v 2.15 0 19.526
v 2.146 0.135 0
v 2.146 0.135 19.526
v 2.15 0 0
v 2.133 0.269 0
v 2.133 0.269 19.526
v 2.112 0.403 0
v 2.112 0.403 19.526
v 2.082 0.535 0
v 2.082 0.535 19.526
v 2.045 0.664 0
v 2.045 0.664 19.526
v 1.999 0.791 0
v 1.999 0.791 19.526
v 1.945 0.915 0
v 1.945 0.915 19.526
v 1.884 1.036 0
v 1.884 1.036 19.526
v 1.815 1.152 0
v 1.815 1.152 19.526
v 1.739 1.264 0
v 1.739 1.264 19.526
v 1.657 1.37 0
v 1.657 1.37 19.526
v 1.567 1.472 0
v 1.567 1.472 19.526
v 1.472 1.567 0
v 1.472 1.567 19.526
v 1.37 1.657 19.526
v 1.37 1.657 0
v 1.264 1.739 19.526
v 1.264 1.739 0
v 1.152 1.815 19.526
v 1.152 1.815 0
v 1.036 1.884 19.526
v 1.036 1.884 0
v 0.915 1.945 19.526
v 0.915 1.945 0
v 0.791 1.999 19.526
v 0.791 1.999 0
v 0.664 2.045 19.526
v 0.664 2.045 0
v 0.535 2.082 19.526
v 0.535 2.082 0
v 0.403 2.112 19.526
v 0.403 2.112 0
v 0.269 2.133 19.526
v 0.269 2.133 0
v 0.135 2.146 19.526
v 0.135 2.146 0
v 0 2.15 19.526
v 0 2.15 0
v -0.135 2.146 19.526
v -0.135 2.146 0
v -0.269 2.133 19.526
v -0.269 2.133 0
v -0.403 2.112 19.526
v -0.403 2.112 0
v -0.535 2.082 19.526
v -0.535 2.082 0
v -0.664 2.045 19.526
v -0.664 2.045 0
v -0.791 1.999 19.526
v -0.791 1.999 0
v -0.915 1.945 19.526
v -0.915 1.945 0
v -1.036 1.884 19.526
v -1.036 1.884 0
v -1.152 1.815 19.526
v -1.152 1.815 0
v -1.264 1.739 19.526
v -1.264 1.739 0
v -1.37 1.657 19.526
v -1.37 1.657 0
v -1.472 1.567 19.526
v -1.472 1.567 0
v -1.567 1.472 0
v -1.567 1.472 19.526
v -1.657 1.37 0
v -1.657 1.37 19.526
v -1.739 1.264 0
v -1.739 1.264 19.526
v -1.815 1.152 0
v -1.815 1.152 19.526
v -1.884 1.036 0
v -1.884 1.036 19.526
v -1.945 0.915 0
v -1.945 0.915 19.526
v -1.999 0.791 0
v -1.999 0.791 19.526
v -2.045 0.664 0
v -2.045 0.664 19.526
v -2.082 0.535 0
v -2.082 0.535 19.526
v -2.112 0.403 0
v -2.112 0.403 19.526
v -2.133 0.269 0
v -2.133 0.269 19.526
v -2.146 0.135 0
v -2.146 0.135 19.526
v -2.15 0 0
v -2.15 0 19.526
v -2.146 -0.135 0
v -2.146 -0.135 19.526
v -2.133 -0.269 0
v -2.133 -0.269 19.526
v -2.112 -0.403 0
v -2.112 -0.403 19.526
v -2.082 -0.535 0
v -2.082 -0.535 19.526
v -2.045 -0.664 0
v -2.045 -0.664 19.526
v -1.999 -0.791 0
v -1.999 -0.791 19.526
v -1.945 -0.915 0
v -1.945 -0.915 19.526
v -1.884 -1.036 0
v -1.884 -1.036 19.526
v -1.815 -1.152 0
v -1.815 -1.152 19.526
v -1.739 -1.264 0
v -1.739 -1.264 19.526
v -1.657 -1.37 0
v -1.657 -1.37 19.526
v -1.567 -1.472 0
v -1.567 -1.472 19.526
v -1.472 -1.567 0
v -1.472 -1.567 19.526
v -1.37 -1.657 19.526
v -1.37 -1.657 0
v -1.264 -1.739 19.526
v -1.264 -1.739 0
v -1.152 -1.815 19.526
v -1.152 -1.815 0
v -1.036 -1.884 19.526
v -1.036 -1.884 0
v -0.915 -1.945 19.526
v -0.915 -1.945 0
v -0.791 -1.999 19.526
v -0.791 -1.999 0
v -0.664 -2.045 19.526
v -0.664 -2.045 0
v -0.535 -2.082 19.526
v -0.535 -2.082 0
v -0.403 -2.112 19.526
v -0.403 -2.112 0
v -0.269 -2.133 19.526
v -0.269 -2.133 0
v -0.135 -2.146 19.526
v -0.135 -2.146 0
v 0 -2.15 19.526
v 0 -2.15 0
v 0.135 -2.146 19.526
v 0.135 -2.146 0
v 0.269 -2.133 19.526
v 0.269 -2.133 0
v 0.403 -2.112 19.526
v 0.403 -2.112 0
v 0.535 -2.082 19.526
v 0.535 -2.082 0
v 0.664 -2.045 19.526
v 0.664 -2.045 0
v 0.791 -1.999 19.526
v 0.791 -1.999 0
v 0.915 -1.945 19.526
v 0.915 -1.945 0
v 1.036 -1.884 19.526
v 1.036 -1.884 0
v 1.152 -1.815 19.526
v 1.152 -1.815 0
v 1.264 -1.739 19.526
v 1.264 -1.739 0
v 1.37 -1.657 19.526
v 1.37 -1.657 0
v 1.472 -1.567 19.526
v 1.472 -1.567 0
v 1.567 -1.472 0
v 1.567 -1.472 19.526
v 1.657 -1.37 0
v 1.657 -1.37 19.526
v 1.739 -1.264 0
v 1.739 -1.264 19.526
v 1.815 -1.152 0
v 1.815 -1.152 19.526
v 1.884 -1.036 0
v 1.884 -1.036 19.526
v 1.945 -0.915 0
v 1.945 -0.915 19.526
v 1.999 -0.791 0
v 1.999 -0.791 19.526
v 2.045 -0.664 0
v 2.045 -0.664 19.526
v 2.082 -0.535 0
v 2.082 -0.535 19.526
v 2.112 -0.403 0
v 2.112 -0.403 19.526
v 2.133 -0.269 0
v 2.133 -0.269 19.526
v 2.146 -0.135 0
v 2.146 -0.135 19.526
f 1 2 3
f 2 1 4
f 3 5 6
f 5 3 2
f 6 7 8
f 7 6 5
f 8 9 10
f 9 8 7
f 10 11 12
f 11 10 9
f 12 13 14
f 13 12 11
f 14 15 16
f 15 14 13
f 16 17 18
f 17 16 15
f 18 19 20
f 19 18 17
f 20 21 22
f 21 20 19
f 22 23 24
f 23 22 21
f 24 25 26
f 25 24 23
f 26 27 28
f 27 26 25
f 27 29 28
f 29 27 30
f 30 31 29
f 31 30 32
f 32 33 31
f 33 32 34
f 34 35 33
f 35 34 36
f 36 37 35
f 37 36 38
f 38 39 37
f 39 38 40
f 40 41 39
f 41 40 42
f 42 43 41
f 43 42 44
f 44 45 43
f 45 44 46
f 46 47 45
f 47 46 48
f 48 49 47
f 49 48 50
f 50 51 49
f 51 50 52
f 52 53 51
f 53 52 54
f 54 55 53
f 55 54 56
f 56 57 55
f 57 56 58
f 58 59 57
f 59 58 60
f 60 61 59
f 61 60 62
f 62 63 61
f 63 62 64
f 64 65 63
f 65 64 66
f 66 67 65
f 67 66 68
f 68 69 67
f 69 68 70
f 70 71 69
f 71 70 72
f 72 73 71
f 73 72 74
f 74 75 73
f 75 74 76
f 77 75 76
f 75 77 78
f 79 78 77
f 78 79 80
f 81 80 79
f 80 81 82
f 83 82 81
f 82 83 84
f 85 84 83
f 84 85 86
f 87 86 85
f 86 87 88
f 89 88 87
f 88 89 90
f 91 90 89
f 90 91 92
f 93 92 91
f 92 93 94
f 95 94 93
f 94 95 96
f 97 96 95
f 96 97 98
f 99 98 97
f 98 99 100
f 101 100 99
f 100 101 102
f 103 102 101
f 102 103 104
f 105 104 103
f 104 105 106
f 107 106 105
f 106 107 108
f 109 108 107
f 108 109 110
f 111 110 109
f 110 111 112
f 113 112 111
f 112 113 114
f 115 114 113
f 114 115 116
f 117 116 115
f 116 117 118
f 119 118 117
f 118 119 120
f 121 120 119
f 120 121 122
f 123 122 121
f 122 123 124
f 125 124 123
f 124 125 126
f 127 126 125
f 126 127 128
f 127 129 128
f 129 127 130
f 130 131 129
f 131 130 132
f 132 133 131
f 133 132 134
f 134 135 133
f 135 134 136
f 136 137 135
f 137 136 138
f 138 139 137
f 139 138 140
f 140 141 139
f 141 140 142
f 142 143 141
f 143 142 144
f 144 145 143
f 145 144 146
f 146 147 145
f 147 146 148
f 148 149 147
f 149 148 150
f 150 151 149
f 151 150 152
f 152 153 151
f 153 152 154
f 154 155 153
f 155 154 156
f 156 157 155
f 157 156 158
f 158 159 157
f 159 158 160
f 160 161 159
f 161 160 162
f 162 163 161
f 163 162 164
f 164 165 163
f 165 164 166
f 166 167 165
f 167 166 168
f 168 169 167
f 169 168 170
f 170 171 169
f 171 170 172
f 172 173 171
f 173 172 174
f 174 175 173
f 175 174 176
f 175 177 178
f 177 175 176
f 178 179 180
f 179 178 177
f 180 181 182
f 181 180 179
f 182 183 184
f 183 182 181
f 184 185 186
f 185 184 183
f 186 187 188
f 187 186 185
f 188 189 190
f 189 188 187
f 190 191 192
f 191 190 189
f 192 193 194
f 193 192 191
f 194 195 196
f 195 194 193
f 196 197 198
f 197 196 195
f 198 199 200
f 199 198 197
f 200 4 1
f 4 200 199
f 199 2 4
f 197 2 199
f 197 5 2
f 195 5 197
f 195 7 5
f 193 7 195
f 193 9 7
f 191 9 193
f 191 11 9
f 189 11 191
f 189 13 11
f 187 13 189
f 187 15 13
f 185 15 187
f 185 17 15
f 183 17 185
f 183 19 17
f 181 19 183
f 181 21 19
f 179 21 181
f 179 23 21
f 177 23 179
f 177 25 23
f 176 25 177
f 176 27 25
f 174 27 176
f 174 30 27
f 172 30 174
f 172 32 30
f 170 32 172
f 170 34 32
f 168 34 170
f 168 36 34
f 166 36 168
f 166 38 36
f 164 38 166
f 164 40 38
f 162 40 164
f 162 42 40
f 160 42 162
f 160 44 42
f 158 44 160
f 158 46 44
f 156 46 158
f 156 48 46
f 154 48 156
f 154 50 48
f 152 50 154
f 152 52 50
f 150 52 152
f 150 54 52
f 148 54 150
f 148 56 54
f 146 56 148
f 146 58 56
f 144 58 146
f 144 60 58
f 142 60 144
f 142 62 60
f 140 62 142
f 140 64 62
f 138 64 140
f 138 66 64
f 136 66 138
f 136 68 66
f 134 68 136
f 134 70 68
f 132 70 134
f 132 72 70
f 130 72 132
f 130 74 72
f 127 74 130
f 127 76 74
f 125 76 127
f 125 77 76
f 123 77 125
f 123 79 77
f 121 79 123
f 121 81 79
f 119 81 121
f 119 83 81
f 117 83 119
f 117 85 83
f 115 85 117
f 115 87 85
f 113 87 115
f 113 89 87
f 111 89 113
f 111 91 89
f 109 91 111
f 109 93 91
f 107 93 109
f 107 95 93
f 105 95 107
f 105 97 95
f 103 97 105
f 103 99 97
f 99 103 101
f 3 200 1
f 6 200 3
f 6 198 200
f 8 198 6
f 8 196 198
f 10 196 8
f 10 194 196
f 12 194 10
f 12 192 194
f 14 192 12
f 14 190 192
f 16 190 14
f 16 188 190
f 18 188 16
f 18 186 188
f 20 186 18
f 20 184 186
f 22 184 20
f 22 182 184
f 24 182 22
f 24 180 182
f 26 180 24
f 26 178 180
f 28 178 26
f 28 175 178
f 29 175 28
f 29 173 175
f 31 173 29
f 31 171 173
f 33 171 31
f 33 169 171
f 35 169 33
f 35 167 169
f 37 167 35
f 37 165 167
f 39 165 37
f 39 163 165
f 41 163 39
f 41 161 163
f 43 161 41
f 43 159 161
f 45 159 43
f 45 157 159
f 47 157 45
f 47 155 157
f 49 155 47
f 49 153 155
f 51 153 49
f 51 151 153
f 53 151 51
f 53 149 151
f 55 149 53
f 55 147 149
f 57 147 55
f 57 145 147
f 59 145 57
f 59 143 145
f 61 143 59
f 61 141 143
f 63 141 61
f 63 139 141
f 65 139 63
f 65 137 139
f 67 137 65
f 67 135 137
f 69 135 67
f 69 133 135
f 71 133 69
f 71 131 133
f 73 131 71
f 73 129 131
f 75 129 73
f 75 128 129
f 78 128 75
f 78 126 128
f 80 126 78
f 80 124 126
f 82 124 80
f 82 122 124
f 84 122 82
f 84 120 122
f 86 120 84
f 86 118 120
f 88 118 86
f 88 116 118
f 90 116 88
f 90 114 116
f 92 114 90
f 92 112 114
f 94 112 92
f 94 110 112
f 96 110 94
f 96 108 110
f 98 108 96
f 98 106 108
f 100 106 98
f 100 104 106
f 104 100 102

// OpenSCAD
////////////////////////////////////////////////////////////////////////////////
//
// Headstock.scad
//
// Contains OpenScad code for the headstock for the guitar chord chart
// project.
//
// Copyright (C) 2015-2016 Joseph M. Corbett
//
// This program is free software: you can redistribute it and/or modify it under
// the terms of the GNU General Public License as published by the Free Software
// Foundation, either version 3 of the License, or (at your option) any later
// version.
//
// This program is distributed in the hope that it will be useful, but
// WITHOUT ANY WARRANTY; without even the implied warranty of MERCHANTABILITY or
// FITNESS FOR A PARTICULAR PURPOSE. See the GNU General Public License for more
// details.
//
// You should have received a copy of the GNU General Public License along with
// this program. If not, see <http://www.gnu.org/licenses>.
//
/////////////////////////////////////////////////////////////////////////////////

include <ChordChartParameters.scad>             // For part parameters.
use<MCAD/regular_shapes.scad>                   // For torus().
use<MCAD/boxes.scad>                            // For roundedBox().


// Local constants
HoleTolerance           = 0.2;                  // Amount to enlarge holes.
PrinterTolerance        = 0.2;                  // Amount to enlarge hole diameters
                                                //    due to printing tolerance.


// Position children at tuner holes.
module TunerPositions()
{
    // For each tuner hole.
    for (xlation = TunerCoords)
    {
        // For each child.
        for (theChild = [0:$children - 1])
        {
            // Translate the child.
            translate(xlation) children(theChild);
        }
    }
}

// A single tuner shaft that connects the tuner box to the tuning knob.
module TunerShaft(tolerance = 0)
{
    // Shaft which will plug into a tuning knob.
    cylinder(r = TunerShaftRadius + tolerance / 2 + 0.1, h = TunerShaftLength);
}

// A single tuner box.  Part of the tuner assembly.
module TunerBox()
{
    difference()
    {
        // A tuner box consists of a box...
        translate([(TunerHoleSpacing - TunerBoxLength) / 2, 
                   (TunerBaseWidth-TunerBoxWidth) / 2, TunerBaseThickness])
                   cube([TunerBoxLength, TunerBoxWidth, TunerBoxHeight]);
        // ... and a hole for the shaft which will plug into a tuning knob.
        translate([2 * TunerHoleSpacing / 3,
                  TunerBaseWidth / 2, TunerBoxHeight / 2 + TunerBaseThickness])
          rotate(X * 90) 
          TunerShaft(PrinterTolerance);
    }
}

// A tuner post contains the concave post, a bushing, and a hole for the string.
module TuningPost()
{
        difference()
        {
            // The post itself.
            cylinder(r = TunerHoleRadius-PrinterTolerance / 2, 
                     h = HeadThickness + TunerBushingHeight + TunerPostHeight +
                       TunerBoxHeight / 2 + TunerBaseThickness - PrinterTolerance - 2);
            // Make the post concave by subtracting a torus from its outside.
            translate([0, 0, HeadThickness + TunerPostHeight / 2 + TunerBushingHeight +
                       TunerBoxHeight / 2 + TunerBaseThickness - 2])
                torus(outerRadius = 30, innerRadius = TunerHoleRadius - 0.7);
            // The hole for the string.
            translate([-TunerHoleRadius - 1, 0, 
                      HeadThickness+TunerPostHeight / 2 + TunerBushingHeight +
                      TunerBoxHeight / 2 + TunerBaseThickness - 2])
                      rotate(Y * 90) cylinder(r = TunerStringHoleRadius, 
                                              h = TunerHoleRadius * 2 + 2);
        }
        // The bushing around the post.
        translate([0, 0, HeadThickness + TunerBoxHeight / 2 + TunerBushingHeight - PrinterTolerance - 2]) 
            cylinder(r1 = TunerBushingRadius, r2 = TunerHoleRadius, h = TunerBushingHeight);
}


// A tuning knob that connects to the tuning shaft.
module TuningKnob()
{
    height = 2 * TunerShaftRadius + PrinterTolerance + 2.4;
    intersectDiameter = 4 * TunerHoleSpacing;

//    rotate(Z * (-90+TunerAngle)) 
    difference()
    {
        intersection()
        {
            // The basic knob.
            scale([0.75, 1, 1]) cylinder(d = TunerHoleSpacing * 0.75, h = height);
            // Round the top of the knob.
            translate([0, 0, -intersectDiameter / 2 + height])
                sphere(d = intersectDiameter);
            // Round the bottom of the knob.
            translate([0, 0, intersectDiameter / 2]) sphere(d = intersectDiameter);
        }
        // Bore out the hole for the tuning shaft.
        translate([2, 0, TunerShaftRadius + PrinterTolerance + 1]) rotate(Y * 90)
            cylinder(r = TunerShaftRadius + PrinterTolerance, h = 10);
    }
}

// A tuner assembly that includes the tuner base and tuner boxes.
module TunerAssembly()
{
    // Rotate the entire assembly.
    rotate([180, 0, TunerAngle])
    difference()
    {
        union()
        {
            // The tuner base that accommodates all 6 tuner boxes.
            translate([TunerBaseLength / 2, 
                       TunerBaseWidth / 2, 
                       TunerBaseThickness / 2])
            roundedBox(size = [TunerBaseLength, TunerBaseWidth, 
                       TunerBaseThickness], radius = 3, sidesonly = true);
            // The six tuner boxes.
            for (i = [0:len(TunerCoords) - 1])
            {
                translate([i * TunerHoleSpacing, 0, 0]) TunerBox();
            }
        }
        // The holes in the base and box to accommodate the tuner mounting post.
        for (i = [0:len(TunerCoords) - 1])
        {
            translate([i * TunerHoleSpacing + TunerHoleSpacing / 3,
                       TunerBaseWidth / 2, 
                      -(TunerBoxHeight + TunerBaseThickness)])
            cylinder(r = TunerHoleRadius, 
                     h = HeadThickness / 2 + TunerBushingHeight + TunerBoxHeight - 1 - PrinterTolerance);
        }
    }
}

// The headstock without holes.  All dimensions gathered from the internet.
// http://img.photobucket.com/albums/v208/jwells393/TeleHeadstock.jpg
module HeadstockBlank()
{
    // Ad hoc headstock shape.  Taken from internet plans.
    difference()
    {
        union()
        {
            difference()
            {
                translate([0, 35, 0])
                    rotate([0, 0, -90]) cube([70.1, 175, HeadThickness]);
                translate([18, 29, -1]) 
                    cube([7, 7, HeadThickness + 2]);
                translate([3.68, 36.95, -1]) 
                    cylinder(r = 16, h = HeadThickness + 2);
                translate([129.49, -46.6, -1]) 
                    cylinder(r = 16, h = HeadThickness + 2);
                translate([3.68, -173.36, -1])
                    cylinder(r=152.4, h = HeadThickness + 2);
                translate([0, 41.91/2, -1])
                    cube([3.68, 3.68, HeadThickness + 2]);
                translate([0, -41.91/2 - 3.68, -1])
                    cube([3.68, 3.68, HeadThickness + 2]);
            }

            translate([28.69, 22.87, 0]) cylinder(r = 12.7, h = HeadThickness);
            translate([168.66, -19.92, 0]) cylinder(r = 12.7, h = HeadThickness);
            difference()
            {
                translate([159.6, -23.25, 0]) cylinder(r = 22.35, h = HeadThickness);
                translate([130, -16, -1]) cube([70, 50, HeadThickness + 2]);
            }

            difference()
            {
                translate([93, 27.9, 0]) cylinder(r = 67.9, h = HeadThickness);
                translate([0, -5, -1]) cube([200, 110, HeadThickness + 2]);
            }
        }
        translate([29, 36, -1]) rotate(Z * TunerAngle) cube([200, 200, HeadThickness + 2]);
    }
}

// Translate in the tuner hole coordinate system (TunerAngle degrees about Z).
module TranslateInTunerCoords(xlation = [0, 0, 0])
{
    for (theChild = [0:$children - 1])
    {
        rotate(Z * TunerAngle) 
        translate(xlation)
        rotate(Z * -TunerAngle)
        children(theChild);
    }
}

// Text to emboss into the headstock (just silly stuff).
module HeadstockText()
{
    // Add some text at the top of the headstock.
    jmcLabel = "JMC";
    jmcBlockSize = 7;
    jmcBlockHeight = HeadThickness * 0.5;
    jmcFont = "Magneto:style=Bold";
//    jmcFont = "Castellar:style=Regular";
    TranslateInTunerCoords([167, 37, HeadThickness * 0.9]) rotate([0, 0, 170 + 90 - 5])
    linear_extrude(height = jmcBlockHeight)
    {
       text(text = jmcLabel, font = jmcFont, size = jmcBlockSize);
    }
    
    // Add some text along the side.
    sideLabel = "Chord-O-Matic";
//    sideLabel = "CHORD-O-MATIC";
    sideBlockSize = 5;
    sideBlockHeight = HeadThickness * 0.5;
    sideBlockFont = "Magneto:style=Bold";
//    sideBlockFont = "Brush Script Std:style=Medium";
    TranslateInTunerCoords([30, 0, HeadThickness * 0.9]) rotate([0, 0, TunerAngle])
    linear_extrude(height = sideBlockHeight)
    {
       text(text = sideLabel, font = sideBlockFont, size = sideBlockSize);
    }
}

// The headstock with all holes added.
module HeadstockWithHoles()
{
    difference()
    {
        // The blank headstock.
        color(HeadstockColor) HeadstockBlank();
        // The tuning post holes.
        for(i = TunerCoords)
        {
            translate(i - HoleTolerance * Z) 
                cylinder(r = TunerHoleRadius, h = HeadThickness + 2 * HoleTolerance);
        }
        // The headstock text.
        color(HeadTextColor) HeadstockText();                   
    }
}

// The full headstock with holes and neck connector.
module HeadstockFull()
{
    ConnectorWidth = FBWidth - 2 * MatingSupportWidth - 0.5;
    ConnectorHeight = 5;
    
    difference()
    {
        // Start with the rotated headstock with holes and slide it over so
        // that the end of the rotated headstock aligns with the x origin.
        translate([-HeadThickness * sin(HeadstockYAngle), 0, 0])
            rotate(HeadstockAngle) HeadstockWithHoles();
        // Cut off the overhang that was created by translating the headstock above.
        translate([-FBWidth - 1, -(FBWidth + 1) / 2, -1]) cube(FBWidth + 1);
    }
    difference()
    {
        // Add a connector to mate with the guitar neck.
        color(HeadstockColor) //%%%%%%%%%%%%%%%
            translate([-1.5 * NutWidth, -ConnectorWidth / 2, -ConnectorHeight - 1]) 
            cube([5.5 * NutWidth + PrinterTolerance, ConnectorWidth, ConnectorHeight]);
        // Bore out holes for the nut studs.
        translate([-NutWidth, -FBWidth / 2, -1]) Nut(HoleTolerance);
    }
}

// Headstock assembly with holes, text, and all tuner parts.
module HeadstockAssembly()
{
    // Start with the complete headstock.
    HeadstockFull();
    // Rotate the entire tuner mechanism.
    rotate(HeadstockAngle)
    {
        // Add the tuner parts at the correct positions.
        TunerPositions()
        {
            // Add the tuning knobs.
            color(TuningKnobColor) 
                TranslateInTunerCoords([6.5, 
                           24, 
                           -TunerBaseThickness - TunerBoxHeight / 2 + 2 - 5.5] - 
                            Explode * ExplodeZOffset + 2 * Explode *ExplodeYOffset)
                rotate(Z * (-90 + TunerAngle)) 
                TuningKnob();
            // Add the tuning posts.
            color(TuningPostColor) translate([0,  0,  -4] + ExplodeZOffset * Explode)
                TuningPost();
            // Add the tuner shafts.
            color(TuningPostColor) TranslateInTunerCoords([6.5, 
                                              TunerBaseWidth + 12,
                                              -TunerBaseThickness - TunerBoxHeight / 2 + 2 - 1.8]
                                              - Explode*ExplodeZOffset+Explode*ExplodeYOffset)
                rotate([90, 0, TunerAngle]) 
                TunerShaft(0);            
        }
        // Add the tuner assembly.
        color(TunerAssemblyColor) translate([36,  30.5, 0] - Explode * ExplodeZOffset) TunerAssembly();
    }
}

// FOR TEST ONLY - print the lower part of the headstock.
module TestHeadNeckConnection()
{
    translate([0, 0, HeadThickness])
    rotate(HeadstockAngle + [180, 0, 0])
    intersection()
    {
        HeadstockFull();
        translate([20, 0, 0])
            cube([60, 75, 50], center = true);
    }
}

// Output the headstock in a printer friendly orientation.
module PrintHeadstock()
{
    translate([0, 100, HeadThickness])
        rotate(HeadstockAngle + [180, 0, -90])
        HeadstockFull($fn = 200);
}

// Output the tuning post in a printer friendly orientation.
module PrintTuningPost()
{
    translate([0, 0, 
               HeadThickness + TunerBushingHeight + TunerPostHeight +
               TunerBoxHeight / 2 + TunerBaseThickness - 2])
       rotate([180, 0, 0])
        TuningPost();
}

// Output the tuning knob in a printer friendly orientation.
module PrintTuningKnob()
{
    translate([0, 0, TunerHoleSpacing * 0.75 * 0.75 / 2]) rotate([0, 90, 0])
        TuningKnob();
}

// Output the printer assembly in a printer friendly orientation.
module PrintTunerAssembly()
{
    translate([-TunerBaseLength / 2, 0, 0])
        rotate([180, 0, TunerAngle]) TunerAssembly();
}


// TestHeadNeckConnection();
// HeadstockAssembly();



// PrintHeadstock();
// PrintTuningPost();
// PrintTunerAssembly();
// PrintTuningKnob();
TunerShaft(0.1);
